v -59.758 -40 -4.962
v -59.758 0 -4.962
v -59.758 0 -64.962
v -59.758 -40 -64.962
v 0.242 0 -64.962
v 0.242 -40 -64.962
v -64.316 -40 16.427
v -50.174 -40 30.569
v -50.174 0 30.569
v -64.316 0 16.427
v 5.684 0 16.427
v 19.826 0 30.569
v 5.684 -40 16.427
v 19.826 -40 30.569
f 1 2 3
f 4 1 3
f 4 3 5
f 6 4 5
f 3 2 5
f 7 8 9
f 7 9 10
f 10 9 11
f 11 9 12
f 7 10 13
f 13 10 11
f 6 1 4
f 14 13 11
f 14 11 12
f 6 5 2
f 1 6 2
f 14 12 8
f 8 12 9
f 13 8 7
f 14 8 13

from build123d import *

# Parameters (mm, degrees)
F2_DEPTH = 40


with BuildPart() as f2:
    # F1 (on Front) + F0 (on Front) → F2 (new body)
    with BuildSketch(Plane.XZ):
        Polygon((0.242183, -64.961628), (-59.757817, -4.961628), (-59.757817, -64.961628), align=None)
    with BuildSketch(Plane.XZ):
        Polygon((-50.173509, 30.569221), (-64.315644, 16.427085), (5.684356, 16.427085), (19.826491, 30.569221), align=None)
    extrude(amount=F2_DEPTH)


solid = f2.part
